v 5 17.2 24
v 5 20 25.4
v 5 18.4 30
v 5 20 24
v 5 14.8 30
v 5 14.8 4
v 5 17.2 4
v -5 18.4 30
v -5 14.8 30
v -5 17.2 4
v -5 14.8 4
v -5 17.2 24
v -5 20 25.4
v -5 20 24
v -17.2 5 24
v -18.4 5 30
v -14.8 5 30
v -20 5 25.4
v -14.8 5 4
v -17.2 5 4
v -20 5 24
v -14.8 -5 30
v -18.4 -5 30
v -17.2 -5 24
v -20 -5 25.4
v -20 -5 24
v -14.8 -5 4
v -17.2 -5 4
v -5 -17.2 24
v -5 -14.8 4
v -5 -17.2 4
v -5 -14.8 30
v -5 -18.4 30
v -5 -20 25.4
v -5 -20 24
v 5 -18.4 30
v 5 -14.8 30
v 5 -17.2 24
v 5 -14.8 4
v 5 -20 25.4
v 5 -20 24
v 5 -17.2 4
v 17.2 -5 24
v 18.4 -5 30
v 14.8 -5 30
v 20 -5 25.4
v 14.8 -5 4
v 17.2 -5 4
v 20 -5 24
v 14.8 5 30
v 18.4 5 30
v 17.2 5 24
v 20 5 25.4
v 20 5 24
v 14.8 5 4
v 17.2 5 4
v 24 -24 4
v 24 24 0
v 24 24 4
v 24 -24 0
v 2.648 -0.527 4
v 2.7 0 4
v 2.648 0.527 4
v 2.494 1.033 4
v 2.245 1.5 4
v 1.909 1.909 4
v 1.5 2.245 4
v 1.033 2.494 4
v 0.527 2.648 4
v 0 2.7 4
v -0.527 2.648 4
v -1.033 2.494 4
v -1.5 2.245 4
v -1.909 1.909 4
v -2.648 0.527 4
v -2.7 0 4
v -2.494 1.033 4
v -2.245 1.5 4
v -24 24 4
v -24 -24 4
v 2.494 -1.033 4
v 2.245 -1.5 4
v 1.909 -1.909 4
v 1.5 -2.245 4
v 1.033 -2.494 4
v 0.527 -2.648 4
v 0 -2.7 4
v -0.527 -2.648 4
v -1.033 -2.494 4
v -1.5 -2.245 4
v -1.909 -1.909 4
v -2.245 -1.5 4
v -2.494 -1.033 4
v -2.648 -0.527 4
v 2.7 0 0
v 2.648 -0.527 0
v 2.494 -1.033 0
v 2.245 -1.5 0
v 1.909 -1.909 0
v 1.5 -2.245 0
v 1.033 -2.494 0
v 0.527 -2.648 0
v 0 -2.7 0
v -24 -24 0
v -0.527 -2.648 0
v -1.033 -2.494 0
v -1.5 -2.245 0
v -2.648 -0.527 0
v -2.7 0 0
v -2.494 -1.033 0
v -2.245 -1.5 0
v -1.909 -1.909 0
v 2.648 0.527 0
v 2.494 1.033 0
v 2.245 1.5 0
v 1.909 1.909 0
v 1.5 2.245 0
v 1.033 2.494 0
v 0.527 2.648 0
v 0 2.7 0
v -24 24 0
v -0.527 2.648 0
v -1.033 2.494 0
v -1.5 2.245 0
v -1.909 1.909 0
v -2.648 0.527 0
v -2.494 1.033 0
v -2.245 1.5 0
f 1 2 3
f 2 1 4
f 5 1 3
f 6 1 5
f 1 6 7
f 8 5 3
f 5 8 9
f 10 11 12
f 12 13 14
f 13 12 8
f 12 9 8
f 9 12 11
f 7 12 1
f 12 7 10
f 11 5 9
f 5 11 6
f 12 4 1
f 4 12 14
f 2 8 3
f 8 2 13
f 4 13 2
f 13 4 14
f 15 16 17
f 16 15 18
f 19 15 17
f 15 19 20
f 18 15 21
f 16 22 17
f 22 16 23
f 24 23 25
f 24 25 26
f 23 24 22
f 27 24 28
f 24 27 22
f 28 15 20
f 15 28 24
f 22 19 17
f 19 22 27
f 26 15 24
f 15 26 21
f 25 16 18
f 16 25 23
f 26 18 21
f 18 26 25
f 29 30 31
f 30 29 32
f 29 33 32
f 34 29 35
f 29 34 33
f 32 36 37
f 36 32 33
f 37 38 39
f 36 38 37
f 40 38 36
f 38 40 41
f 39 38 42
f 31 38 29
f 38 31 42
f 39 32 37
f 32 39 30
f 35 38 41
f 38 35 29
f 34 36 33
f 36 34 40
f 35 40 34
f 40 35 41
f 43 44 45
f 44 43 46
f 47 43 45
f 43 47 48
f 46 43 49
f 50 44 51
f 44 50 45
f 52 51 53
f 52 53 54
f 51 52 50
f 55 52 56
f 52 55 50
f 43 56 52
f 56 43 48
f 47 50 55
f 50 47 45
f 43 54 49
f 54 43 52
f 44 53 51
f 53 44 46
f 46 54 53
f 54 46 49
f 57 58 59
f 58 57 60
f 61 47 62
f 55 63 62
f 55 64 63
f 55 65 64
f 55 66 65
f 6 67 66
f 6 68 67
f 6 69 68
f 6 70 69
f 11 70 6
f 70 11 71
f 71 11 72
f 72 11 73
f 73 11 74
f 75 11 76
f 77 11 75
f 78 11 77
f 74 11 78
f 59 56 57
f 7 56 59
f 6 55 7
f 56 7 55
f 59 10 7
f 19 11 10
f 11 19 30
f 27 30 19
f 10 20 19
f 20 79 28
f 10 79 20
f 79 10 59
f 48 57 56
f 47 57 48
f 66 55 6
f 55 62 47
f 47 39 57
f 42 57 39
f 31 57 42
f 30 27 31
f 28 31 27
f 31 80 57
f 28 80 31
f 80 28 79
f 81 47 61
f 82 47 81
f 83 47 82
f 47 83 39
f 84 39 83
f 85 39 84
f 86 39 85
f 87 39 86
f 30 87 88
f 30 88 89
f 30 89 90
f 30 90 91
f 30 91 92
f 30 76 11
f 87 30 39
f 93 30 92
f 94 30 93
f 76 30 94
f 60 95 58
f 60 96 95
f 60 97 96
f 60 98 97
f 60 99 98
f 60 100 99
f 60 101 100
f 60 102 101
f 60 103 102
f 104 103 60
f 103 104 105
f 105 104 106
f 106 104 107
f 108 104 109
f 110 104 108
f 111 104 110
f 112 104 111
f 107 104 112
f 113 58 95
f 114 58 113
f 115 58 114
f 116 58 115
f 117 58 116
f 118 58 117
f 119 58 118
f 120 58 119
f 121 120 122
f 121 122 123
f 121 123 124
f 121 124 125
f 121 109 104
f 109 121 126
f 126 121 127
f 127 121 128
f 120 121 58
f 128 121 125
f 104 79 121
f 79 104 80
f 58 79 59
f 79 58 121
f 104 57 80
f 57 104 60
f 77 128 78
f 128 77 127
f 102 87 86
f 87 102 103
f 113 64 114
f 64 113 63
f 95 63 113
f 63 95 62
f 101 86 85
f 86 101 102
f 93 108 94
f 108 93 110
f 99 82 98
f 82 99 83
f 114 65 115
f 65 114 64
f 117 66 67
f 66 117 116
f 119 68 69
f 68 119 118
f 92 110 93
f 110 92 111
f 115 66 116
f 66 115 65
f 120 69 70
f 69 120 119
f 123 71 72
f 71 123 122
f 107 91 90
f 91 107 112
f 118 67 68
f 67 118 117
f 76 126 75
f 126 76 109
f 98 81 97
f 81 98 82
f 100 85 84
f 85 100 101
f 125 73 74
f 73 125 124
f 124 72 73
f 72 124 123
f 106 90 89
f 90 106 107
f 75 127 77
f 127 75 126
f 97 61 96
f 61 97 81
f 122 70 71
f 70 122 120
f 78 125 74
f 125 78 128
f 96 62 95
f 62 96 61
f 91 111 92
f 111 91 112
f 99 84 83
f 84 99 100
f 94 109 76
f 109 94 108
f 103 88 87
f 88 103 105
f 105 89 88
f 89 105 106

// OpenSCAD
$fn = 32;

// ----------------------------------------------------------------------
// Snap-fit latch: 4 arms, 26 mm tall, 3 mm undercut hooks
// ----------------------------------------------------------------------

// --- parameters (mm) ---
base_d = 48;              // base plate depth
base_h = 4;               // base plate thickness
span = 32;                // distance between opposite arms
arm_t = 2.4;              // arm thickness
arm_d = 10;               // arm width
height = 26;              // free arm length
head_len = 3;             // hook reach
head_h = 6;               // hook height
lead = 1.4;               // lead-in ramp thickness
bore_d = 5.4;             // base fixing bore
top_z = 30;               // height of the arm tips above the base

arms = 4;

difference() {
  union() {
    /* base plate, centred on the arm ring */
    translate([-24, -24, 0]) cube([base_d, base_d, base_h]);
    for (a = [0 : 360 / arms : 359]) rotate([0, 0, a]) {
    /* arm, sunk 0.5 mm into the base */
    translate([-arm_d / 2, span / 2 - arm_t / 2, base_h - 0.5]) cube([arm_d, arm_t, height + 0.5]);
    /* hook: a convex hull of a tall inner block and a thin outer lip
       gives a flat undercut below and a lead-in ramp on top */
    hull() {
      translate([-arm_d / 2, span / 2 + arm_t / 2 - 0.6, top_z - head_h]) cube([arm_d, lead + 0.4, head_h]);
      translate([-arm_d / 2, span / 2 + arm_t / 2 - 0.2, top_z - head_h]) cube([arm_d, head_len, lead]);
    }
    }
  }
  translate([0, 0, -2.5]) cylinder(h = base_h + 5, d = bore_d);
}
